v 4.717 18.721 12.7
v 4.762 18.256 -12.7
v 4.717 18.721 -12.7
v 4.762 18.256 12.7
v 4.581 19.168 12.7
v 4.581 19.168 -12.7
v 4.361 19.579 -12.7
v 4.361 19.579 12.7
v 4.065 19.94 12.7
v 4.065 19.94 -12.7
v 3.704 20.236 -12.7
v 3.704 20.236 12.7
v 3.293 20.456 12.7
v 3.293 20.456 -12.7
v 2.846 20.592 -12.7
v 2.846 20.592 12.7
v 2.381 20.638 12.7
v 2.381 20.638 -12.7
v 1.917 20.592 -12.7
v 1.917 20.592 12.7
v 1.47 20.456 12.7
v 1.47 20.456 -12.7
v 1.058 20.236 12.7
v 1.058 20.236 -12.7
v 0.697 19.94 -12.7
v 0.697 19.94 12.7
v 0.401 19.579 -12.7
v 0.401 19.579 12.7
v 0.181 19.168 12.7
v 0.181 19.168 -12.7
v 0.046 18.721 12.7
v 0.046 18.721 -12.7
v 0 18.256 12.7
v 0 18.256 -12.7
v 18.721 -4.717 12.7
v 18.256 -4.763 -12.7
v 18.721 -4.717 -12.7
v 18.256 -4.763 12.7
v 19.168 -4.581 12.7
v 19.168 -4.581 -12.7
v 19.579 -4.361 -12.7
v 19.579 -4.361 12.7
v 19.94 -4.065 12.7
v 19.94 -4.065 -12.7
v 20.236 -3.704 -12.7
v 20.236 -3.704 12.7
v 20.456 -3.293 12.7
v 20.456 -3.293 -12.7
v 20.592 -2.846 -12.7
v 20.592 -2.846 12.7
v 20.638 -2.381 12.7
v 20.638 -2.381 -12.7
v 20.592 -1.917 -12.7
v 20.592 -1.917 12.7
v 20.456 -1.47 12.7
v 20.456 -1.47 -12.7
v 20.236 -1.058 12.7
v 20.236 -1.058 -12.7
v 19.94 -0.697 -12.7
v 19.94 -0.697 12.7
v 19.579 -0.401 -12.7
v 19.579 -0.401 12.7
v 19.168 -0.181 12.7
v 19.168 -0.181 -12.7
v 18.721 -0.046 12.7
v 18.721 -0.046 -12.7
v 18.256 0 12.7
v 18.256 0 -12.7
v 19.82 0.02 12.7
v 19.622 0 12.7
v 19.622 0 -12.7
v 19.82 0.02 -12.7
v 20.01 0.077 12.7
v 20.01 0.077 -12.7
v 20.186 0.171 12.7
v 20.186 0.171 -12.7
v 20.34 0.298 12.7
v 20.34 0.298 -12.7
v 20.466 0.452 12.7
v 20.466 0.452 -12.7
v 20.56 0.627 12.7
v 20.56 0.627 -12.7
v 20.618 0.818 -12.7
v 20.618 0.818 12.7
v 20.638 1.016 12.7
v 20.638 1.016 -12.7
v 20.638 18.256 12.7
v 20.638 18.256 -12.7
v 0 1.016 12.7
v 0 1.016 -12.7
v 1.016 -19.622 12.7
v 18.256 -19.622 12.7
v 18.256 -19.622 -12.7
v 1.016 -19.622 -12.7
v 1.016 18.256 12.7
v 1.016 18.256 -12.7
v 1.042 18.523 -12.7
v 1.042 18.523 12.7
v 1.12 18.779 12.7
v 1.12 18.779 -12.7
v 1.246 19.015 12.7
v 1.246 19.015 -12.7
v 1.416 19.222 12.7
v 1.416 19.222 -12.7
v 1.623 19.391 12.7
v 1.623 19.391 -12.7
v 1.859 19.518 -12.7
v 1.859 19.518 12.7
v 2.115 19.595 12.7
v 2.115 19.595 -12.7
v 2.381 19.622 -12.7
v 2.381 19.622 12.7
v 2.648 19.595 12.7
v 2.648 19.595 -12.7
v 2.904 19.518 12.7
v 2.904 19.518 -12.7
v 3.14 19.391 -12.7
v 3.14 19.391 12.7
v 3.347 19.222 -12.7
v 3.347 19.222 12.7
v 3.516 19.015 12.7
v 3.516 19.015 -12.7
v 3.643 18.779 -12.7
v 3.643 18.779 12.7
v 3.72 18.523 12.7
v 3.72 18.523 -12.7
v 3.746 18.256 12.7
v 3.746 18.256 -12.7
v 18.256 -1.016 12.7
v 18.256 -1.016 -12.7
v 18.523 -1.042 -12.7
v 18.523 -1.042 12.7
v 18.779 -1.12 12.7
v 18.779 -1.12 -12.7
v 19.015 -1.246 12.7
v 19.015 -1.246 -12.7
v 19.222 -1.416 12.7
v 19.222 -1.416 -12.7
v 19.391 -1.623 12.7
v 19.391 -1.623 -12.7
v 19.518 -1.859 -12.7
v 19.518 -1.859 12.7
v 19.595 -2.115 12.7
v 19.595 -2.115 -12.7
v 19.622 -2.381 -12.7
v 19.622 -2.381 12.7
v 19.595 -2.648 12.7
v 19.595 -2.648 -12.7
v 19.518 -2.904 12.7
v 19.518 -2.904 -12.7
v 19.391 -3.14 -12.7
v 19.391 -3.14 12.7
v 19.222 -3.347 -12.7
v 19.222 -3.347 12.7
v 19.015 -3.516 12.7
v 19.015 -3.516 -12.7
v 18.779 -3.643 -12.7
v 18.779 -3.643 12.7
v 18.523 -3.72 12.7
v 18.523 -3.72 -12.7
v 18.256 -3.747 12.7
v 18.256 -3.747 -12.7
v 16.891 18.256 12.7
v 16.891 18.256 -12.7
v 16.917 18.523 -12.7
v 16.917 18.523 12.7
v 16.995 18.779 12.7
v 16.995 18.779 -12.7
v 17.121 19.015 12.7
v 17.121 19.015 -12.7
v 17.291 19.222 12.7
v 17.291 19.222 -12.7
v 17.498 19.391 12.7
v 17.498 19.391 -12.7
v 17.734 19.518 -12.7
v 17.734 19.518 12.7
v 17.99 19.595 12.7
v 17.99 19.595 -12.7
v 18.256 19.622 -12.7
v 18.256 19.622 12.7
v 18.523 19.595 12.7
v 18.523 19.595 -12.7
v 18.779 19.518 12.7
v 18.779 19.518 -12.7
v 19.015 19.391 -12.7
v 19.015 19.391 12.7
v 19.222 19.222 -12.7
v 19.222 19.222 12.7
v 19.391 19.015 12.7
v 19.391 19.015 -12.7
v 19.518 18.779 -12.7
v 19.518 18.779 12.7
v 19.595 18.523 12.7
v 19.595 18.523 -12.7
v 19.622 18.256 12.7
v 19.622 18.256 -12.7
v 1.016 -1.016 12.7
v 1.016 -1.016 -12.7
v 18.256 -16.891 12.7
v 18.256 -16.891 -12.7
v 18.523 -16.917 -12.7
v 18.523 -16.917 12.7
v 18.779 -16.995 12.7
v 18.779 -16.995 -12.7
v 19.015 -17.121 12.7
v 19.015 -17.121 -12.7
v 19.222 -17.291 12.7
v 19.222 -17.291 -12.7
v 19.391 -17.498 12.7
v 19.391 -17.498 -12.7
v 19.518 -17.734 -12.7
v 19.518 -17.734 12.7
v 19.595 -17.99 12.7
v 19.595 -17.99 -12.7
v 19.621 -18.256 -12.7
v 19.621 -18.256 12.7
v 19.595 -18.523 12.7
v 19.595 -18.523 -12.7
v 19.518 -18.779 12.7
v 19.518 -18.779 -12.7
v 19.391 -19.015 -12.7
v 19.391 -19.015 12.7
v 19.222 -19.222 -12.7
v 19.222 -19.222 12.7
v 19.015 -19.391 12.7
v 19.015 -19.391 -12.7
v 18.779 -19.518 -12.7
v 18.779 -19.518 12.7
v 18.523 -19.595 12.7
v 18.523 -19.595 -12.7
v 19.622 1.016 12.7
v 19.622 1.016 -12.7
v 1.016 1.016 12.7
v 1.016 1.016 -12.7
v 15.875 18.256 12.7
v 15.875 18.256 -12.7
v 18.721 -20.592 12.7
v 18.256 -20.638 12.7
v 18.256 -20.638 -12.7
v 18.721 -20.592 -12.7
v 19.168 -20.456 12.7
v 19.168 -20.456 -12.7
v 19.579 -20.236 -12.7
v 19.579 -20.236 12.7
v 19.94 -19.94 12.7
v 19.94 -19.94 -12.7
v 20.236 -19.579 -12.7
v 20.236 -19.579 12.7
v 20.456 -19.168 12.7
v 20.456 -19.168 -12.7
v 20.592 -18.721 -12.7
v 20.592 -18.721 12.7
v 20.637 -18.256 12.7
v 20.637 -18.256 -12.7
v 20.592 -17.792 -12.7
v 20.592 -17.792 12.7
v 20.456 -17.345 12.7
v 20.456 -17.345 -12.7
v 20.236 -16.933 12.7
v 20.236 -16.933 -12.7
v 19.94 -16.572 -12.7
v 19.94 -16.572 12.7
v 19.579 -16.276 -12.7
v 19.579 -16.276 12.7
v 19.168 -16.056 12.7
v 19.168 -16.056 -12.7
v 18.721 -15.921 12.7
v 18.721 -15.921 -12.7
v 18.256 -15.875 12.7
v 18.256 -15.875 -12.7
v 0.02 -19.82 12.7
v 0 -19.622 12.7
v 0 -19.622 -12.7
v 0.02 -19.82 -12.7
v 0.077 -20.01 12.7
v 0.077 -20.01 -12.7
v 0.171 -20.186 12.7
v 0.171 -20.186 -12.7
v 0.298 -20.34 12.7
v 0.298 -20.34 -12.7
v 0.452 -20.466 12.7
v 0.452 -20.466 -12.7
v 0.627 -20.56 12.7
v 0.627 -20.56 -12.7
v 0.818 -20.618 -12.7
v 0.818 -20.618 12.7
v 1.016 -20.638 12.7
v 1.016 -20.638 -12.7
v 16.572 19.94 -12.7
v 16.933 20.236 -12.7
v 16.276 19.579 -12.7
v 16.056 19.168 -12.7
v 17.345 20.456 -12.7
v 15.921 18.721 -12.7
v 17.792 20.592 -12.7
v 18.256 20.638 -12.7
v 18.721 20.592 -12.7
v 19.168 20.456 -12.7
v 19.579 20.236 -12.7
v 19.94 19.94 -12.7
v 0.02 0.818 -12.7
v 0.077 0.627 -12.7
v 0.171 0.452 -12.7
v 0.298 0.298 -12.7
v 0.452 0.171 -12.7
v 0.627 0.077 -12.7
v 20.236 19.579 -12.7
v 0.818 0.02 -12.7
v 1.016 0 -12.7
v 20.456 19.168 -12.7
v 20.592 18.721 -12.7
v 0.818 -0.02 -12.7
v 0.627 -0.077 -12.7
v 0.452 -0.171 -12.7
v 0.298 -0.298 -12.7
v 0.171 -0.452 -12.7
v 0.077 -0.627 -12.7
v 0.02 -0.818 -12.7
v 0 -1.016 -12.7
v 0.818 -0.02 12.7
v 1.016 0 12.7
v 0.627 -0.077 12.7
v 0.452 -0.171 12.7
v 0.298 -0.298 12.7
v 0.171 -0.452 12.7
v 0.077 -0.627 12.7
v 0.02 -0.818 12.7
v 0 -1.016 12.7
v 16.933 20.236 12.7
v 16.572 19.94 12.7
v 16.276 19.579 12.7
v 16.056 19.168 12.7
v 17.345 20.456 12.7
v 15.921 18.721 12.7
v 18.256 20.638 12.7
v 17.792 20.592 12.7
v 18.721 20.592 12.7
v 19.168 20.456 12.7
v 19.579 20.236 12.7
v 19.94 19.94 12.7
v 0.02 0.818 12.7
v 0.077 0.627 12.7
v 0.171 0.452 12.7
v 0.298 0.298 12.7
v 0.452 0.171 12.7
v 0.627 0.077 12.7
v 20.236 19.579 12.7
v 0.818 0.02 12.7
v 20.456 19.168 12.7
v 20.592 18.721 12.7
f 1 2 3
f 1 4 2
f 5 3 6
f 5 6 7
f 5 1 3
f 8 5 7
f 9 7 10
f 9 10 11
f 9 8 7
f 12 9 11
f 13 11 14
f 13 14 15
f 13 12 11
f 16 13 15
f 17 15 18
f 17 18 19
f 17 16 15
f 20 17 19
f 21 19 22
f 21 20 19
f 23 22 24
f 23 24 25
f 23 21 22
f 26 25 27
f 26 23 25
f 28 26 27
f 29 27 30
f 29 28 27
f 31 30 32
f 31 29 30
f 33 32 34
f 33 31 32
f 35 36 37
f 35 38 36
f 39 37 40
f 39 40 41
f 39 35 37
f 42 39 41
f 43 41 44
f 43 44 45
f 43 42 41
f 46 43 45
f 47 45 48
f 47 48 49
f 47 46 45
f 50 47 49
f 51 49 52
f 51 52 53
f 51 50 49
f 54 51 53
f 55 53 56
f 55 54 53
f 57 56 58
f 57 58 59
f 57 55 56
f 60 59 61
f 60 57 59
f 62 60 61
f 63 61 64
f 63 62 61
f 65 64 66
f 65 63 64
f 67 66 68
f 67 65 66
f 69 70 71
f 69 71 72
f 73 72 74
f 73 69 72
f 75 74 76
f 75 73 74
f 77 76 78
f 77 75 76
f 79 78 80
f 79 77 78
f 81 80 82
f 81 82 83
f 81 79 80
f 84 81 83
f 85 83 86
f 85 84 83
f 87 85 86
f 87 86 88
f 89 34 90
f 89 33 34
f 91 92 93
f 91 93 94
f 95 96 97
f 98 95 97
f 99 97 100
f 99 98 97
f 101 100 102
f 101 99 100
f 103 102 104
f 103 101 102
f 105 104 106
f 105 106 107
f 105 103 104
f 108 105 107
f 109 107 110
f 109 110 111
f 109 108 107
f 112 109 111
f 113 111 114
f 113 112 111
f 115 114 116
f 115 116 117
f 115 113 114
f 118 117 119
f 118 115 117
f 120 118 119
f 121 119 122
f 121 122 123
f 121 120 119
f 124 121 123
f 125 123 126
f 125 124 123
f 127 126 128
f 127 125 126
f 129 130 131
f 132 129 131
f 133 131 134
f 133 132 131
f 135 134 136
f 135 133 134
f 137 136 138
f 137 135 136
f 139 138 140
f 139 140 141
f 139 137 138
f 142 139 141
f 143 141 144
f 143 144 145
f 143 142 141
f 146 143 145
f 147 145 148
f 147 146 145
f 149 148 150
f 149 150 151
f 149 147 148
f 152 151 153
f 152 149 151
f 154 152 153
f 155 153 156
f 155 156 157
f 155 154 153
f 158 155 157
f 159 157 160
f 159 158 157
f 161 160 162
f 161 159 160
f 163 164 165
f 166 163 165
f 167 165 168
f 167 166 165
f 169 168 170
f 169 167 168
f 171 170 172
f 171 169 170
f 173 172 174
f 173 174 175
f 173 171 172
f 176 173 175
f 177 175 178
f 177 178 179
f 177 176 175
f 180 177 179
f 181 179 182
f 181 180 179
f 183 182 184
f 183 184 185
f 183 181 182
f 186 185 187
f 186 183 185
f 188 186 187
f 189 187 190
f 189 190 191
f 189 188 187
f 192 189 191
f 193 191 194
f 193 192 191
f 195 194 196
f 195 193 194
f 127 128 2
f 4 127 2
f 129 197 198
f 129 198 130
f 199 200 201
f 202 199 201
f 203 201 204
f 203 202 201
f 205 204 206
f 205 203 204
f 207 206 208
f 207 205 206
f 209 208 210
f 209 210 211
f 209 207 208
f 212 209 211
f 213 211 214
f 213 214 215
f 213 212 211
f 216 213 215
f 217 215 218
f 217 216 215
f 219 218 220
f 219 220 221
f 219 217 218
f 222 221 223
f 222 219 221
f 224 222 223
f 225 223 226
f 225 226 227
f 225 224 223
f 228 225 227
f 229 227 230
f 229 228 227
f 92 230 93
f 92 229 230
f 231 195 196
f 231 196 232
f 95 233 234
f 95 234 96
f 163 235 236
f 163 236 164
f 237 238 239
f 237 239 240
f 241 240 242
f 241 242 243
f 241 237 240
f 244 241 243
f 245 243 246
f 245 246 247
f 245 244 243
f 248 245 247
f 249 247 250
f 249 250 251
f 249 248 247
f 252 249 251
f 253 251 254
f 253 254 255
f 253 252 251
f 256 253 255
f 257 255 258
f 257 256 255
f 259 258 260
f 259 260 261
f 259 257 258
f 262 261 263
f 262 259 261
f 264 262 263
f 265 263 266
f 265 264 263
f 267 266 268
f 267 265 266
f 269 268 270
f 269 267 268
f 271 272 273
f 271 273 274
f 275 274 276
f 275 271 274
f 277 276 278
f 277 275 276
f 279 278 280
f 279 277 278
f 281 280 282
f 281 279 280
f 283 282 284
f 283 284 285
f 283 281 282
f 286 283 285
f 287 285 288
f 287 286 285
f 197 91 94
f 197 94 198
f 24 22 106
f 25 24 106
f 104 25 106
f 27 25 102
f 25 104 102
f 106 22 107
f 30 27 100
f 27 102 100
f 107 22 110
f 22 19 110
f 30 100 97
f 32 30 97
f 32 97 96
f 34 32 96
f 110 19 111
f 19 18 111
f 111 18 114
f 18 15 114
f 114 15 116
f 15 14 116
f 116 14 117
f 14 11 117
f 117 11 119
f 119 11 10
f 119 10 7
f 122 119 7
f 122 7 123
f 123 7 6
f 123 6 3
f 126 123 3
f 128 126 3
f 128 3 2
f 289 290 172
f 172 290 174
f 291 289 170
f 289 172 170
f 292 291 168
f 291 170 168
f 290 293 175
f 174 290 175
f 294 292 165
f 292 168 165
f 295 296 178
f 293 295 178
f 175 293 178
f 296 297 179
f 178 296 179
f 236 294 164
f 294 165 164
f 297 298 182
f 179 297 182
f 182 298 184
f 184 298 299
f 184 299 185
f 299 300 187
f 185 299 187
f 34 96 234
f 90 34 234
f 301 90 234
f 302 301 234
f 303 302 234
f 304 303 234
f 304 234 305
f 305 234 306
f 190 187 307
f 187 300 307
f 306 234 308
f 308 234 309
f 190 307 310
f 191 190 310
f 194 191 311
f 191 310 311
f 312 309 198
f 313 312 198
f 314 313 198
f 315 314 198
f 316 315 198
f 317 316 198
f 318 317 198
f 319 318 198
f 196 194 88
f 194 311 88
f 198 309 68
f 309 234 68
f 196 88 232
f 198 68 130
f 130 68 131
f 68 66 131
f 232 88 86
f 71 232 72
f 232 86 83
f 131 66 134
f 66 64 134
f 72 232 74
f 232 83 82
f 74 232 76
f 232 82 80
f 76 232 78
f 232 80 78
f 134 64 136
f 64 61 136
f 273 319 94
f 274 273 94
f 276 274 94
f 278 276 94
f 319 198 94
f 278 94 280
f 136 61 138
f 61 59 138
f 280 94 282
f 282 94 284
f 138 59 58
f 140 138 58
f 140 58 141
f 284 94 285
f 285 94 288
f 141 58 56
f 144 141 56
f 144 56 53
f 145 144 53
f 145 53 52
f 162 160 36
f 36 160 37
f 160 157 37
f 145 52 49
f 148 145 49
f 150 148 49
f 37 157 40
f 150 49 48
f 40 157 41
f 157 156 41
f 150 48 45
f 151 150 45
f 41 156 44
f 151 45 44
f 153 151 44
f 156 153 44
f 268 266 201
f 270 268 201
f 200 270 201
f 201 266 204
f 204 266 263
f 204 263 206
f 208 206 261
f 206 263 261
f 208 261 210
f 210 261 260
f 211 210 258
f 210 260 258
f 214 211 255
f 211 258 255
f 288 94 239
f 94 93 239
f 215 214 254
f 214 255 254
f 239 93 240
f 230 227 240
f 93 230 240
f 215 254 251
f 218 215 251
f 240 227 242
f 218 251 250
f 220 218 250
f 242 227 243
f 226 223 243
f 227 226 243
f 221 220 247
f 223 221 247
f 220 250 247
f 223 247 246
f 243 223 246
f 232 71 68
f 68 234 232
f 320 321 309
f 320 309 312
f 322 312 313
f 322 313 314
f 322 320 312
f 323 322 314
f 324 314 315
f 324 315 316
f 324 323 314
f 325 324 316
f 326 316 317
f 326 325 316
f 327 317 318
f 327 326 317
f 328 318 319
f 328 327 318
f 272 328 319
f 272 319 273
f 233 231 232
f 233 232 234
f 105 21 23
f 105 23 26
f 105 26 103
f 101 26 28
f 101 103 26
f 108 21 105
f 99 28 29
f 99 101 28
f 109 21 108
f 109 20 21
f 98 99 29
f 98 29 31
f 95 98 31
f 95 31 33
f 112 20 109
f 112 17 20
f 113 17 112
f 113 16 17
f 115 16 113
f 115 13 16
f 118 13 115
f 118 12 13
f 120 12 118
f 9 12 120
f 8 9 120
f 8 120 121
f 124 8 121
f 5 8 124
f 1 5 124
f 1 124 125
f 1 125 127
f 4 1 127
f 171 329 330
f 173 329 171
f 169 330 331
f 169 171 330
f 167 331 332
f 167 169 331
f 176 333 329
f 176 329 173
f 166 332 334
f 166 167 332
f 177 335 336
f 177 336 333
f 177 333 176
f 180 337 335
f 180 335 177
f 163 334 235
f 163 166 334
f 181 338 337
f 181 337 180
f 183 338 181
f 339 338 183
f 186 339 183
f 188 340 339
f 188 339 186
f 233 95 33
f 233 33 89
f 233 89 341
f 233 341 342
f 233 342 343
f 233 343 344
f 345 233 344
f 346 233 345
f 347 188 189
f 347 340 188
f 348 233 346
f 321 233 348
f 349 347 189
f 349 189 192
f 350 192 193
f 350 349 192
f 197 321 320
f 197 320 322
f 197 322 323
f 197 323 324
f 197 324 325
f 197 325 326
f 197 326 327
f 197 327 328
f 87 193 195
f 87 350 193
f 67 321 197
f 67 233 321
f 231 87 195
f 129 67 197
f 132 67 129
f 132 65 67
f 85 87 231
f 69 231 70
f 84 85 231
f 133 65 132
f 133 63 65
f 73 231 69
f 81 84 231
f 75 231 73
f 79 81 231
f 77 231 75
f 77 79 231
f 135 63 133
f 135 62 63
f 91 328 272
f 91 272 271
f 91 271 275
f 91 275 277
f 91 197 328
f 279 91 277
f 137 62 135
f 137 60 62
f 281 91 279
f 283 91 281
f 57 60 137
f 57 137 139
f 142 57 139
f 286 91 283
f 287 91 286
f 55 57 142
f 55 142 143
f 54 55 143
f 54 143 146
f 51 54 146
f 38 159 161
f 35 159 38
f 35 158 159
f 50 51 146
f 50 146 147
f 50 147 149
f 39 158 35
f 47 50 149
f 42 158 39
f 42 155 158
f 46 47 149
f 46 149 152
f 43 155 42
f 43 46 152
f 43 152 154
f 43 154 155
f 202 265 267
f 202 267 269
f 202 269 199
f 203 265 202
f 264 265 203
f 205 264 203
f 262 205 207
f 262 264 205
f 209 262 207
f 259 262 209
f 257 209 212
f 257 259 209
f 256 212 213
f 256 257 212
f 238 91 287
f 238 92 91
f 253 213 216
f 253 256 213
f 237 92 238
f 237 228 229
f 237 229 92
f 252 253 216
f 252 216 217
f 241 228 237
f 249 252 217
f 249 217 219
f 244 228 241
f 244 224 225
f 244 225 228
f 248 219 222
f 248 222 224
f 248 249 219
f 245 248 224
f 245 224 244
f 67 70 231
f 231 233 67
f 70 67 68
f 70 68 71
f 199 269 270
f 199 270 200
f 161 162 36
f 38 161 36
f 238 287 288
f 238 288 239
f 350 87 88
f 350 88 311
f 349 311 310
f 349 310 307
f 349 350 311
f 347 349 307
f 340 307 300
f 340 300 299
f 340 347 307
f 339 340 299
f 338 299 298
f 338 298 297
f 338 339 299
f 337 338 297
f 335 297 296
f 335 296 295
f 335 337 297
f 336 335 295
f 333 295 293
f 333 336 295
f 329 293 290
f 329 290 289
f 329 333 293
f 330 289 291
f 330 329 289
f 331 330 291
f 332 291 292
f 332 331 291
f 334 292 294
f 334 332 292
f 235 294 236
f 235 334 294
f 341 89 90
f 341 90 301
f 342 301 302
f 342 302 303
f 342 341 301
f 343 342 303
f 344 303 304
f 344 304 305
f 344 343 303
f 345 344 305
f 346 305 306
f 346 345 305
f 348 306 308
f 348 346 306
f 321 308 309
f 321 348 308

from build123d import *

# Parameters (mm, degrees)
BASE_EXTRUDE_DEPTH = 12.7
CIRPATTERN1_COUNT  = 2
CIRPATTERN1_ANGLE  = 270


with BuildPart() as part:
    # Sketch1 → Base-Extrude (new, symmetric)
    with BuildSketch(Plane.XY):
        with BuildLine():
            Line((0, 18.25625), (0, 1.016))
            ThreePointArc((0, 1.016), (0.29757951, 0.29757951), (1.016, 0))
            Line((1.016, 0), (19.6215, 0))
            ThreePointArc((19.6215, 0), (20.33992049, 0.29757951), (20.6375, 1.016))
            Line((20.6375, 1.016), (20.6375, 18.25625))
            ThreePointArc((20.6375, 18.25625), (18.25625, 20.6375), (15.875, 18.25625))
            Line((15.875, 18.25625), (16.891, 18.25625))
            ThreePointArc((16.891, 18.25625), (18.25625, 19.6215), (19.6215, 18.25625))
            Line((19.6215, 18.25625), (19.6215, 1.016))
            Line((19.6215, 1.016), (1.016, 1.016))
            Line((1.016, 1.016), (1.016, 18.25625))
            ThreePointArc((1.016, 18.25625), (2.38125, 19.6215), (3.7465, 18.25625))
            Line((3.7465, 18.25625), (4.7625, 18.25625))
            ThreePointArc((4.7625, 18.25625), (2.38125, 20.6375), (0, 18.25625))
        make_face()
    base_extrude = extrude(amount=BASE_EXTRUDE_DEPTH, both=True)

    # CirPattern1: Base-Extrude ×2 about axis
    cirpattern1_axis = Axis((0, 0, 0), (0, 0, 1))
    for i in range(1, CIRPATTERN1_COUNT):
        add(base_extrude.rotate(cirpattern1_axis, i * CIRPATTERN1_ANGLE / (CIRPATTERN1_COUNT - 1)))


solid = part.part
